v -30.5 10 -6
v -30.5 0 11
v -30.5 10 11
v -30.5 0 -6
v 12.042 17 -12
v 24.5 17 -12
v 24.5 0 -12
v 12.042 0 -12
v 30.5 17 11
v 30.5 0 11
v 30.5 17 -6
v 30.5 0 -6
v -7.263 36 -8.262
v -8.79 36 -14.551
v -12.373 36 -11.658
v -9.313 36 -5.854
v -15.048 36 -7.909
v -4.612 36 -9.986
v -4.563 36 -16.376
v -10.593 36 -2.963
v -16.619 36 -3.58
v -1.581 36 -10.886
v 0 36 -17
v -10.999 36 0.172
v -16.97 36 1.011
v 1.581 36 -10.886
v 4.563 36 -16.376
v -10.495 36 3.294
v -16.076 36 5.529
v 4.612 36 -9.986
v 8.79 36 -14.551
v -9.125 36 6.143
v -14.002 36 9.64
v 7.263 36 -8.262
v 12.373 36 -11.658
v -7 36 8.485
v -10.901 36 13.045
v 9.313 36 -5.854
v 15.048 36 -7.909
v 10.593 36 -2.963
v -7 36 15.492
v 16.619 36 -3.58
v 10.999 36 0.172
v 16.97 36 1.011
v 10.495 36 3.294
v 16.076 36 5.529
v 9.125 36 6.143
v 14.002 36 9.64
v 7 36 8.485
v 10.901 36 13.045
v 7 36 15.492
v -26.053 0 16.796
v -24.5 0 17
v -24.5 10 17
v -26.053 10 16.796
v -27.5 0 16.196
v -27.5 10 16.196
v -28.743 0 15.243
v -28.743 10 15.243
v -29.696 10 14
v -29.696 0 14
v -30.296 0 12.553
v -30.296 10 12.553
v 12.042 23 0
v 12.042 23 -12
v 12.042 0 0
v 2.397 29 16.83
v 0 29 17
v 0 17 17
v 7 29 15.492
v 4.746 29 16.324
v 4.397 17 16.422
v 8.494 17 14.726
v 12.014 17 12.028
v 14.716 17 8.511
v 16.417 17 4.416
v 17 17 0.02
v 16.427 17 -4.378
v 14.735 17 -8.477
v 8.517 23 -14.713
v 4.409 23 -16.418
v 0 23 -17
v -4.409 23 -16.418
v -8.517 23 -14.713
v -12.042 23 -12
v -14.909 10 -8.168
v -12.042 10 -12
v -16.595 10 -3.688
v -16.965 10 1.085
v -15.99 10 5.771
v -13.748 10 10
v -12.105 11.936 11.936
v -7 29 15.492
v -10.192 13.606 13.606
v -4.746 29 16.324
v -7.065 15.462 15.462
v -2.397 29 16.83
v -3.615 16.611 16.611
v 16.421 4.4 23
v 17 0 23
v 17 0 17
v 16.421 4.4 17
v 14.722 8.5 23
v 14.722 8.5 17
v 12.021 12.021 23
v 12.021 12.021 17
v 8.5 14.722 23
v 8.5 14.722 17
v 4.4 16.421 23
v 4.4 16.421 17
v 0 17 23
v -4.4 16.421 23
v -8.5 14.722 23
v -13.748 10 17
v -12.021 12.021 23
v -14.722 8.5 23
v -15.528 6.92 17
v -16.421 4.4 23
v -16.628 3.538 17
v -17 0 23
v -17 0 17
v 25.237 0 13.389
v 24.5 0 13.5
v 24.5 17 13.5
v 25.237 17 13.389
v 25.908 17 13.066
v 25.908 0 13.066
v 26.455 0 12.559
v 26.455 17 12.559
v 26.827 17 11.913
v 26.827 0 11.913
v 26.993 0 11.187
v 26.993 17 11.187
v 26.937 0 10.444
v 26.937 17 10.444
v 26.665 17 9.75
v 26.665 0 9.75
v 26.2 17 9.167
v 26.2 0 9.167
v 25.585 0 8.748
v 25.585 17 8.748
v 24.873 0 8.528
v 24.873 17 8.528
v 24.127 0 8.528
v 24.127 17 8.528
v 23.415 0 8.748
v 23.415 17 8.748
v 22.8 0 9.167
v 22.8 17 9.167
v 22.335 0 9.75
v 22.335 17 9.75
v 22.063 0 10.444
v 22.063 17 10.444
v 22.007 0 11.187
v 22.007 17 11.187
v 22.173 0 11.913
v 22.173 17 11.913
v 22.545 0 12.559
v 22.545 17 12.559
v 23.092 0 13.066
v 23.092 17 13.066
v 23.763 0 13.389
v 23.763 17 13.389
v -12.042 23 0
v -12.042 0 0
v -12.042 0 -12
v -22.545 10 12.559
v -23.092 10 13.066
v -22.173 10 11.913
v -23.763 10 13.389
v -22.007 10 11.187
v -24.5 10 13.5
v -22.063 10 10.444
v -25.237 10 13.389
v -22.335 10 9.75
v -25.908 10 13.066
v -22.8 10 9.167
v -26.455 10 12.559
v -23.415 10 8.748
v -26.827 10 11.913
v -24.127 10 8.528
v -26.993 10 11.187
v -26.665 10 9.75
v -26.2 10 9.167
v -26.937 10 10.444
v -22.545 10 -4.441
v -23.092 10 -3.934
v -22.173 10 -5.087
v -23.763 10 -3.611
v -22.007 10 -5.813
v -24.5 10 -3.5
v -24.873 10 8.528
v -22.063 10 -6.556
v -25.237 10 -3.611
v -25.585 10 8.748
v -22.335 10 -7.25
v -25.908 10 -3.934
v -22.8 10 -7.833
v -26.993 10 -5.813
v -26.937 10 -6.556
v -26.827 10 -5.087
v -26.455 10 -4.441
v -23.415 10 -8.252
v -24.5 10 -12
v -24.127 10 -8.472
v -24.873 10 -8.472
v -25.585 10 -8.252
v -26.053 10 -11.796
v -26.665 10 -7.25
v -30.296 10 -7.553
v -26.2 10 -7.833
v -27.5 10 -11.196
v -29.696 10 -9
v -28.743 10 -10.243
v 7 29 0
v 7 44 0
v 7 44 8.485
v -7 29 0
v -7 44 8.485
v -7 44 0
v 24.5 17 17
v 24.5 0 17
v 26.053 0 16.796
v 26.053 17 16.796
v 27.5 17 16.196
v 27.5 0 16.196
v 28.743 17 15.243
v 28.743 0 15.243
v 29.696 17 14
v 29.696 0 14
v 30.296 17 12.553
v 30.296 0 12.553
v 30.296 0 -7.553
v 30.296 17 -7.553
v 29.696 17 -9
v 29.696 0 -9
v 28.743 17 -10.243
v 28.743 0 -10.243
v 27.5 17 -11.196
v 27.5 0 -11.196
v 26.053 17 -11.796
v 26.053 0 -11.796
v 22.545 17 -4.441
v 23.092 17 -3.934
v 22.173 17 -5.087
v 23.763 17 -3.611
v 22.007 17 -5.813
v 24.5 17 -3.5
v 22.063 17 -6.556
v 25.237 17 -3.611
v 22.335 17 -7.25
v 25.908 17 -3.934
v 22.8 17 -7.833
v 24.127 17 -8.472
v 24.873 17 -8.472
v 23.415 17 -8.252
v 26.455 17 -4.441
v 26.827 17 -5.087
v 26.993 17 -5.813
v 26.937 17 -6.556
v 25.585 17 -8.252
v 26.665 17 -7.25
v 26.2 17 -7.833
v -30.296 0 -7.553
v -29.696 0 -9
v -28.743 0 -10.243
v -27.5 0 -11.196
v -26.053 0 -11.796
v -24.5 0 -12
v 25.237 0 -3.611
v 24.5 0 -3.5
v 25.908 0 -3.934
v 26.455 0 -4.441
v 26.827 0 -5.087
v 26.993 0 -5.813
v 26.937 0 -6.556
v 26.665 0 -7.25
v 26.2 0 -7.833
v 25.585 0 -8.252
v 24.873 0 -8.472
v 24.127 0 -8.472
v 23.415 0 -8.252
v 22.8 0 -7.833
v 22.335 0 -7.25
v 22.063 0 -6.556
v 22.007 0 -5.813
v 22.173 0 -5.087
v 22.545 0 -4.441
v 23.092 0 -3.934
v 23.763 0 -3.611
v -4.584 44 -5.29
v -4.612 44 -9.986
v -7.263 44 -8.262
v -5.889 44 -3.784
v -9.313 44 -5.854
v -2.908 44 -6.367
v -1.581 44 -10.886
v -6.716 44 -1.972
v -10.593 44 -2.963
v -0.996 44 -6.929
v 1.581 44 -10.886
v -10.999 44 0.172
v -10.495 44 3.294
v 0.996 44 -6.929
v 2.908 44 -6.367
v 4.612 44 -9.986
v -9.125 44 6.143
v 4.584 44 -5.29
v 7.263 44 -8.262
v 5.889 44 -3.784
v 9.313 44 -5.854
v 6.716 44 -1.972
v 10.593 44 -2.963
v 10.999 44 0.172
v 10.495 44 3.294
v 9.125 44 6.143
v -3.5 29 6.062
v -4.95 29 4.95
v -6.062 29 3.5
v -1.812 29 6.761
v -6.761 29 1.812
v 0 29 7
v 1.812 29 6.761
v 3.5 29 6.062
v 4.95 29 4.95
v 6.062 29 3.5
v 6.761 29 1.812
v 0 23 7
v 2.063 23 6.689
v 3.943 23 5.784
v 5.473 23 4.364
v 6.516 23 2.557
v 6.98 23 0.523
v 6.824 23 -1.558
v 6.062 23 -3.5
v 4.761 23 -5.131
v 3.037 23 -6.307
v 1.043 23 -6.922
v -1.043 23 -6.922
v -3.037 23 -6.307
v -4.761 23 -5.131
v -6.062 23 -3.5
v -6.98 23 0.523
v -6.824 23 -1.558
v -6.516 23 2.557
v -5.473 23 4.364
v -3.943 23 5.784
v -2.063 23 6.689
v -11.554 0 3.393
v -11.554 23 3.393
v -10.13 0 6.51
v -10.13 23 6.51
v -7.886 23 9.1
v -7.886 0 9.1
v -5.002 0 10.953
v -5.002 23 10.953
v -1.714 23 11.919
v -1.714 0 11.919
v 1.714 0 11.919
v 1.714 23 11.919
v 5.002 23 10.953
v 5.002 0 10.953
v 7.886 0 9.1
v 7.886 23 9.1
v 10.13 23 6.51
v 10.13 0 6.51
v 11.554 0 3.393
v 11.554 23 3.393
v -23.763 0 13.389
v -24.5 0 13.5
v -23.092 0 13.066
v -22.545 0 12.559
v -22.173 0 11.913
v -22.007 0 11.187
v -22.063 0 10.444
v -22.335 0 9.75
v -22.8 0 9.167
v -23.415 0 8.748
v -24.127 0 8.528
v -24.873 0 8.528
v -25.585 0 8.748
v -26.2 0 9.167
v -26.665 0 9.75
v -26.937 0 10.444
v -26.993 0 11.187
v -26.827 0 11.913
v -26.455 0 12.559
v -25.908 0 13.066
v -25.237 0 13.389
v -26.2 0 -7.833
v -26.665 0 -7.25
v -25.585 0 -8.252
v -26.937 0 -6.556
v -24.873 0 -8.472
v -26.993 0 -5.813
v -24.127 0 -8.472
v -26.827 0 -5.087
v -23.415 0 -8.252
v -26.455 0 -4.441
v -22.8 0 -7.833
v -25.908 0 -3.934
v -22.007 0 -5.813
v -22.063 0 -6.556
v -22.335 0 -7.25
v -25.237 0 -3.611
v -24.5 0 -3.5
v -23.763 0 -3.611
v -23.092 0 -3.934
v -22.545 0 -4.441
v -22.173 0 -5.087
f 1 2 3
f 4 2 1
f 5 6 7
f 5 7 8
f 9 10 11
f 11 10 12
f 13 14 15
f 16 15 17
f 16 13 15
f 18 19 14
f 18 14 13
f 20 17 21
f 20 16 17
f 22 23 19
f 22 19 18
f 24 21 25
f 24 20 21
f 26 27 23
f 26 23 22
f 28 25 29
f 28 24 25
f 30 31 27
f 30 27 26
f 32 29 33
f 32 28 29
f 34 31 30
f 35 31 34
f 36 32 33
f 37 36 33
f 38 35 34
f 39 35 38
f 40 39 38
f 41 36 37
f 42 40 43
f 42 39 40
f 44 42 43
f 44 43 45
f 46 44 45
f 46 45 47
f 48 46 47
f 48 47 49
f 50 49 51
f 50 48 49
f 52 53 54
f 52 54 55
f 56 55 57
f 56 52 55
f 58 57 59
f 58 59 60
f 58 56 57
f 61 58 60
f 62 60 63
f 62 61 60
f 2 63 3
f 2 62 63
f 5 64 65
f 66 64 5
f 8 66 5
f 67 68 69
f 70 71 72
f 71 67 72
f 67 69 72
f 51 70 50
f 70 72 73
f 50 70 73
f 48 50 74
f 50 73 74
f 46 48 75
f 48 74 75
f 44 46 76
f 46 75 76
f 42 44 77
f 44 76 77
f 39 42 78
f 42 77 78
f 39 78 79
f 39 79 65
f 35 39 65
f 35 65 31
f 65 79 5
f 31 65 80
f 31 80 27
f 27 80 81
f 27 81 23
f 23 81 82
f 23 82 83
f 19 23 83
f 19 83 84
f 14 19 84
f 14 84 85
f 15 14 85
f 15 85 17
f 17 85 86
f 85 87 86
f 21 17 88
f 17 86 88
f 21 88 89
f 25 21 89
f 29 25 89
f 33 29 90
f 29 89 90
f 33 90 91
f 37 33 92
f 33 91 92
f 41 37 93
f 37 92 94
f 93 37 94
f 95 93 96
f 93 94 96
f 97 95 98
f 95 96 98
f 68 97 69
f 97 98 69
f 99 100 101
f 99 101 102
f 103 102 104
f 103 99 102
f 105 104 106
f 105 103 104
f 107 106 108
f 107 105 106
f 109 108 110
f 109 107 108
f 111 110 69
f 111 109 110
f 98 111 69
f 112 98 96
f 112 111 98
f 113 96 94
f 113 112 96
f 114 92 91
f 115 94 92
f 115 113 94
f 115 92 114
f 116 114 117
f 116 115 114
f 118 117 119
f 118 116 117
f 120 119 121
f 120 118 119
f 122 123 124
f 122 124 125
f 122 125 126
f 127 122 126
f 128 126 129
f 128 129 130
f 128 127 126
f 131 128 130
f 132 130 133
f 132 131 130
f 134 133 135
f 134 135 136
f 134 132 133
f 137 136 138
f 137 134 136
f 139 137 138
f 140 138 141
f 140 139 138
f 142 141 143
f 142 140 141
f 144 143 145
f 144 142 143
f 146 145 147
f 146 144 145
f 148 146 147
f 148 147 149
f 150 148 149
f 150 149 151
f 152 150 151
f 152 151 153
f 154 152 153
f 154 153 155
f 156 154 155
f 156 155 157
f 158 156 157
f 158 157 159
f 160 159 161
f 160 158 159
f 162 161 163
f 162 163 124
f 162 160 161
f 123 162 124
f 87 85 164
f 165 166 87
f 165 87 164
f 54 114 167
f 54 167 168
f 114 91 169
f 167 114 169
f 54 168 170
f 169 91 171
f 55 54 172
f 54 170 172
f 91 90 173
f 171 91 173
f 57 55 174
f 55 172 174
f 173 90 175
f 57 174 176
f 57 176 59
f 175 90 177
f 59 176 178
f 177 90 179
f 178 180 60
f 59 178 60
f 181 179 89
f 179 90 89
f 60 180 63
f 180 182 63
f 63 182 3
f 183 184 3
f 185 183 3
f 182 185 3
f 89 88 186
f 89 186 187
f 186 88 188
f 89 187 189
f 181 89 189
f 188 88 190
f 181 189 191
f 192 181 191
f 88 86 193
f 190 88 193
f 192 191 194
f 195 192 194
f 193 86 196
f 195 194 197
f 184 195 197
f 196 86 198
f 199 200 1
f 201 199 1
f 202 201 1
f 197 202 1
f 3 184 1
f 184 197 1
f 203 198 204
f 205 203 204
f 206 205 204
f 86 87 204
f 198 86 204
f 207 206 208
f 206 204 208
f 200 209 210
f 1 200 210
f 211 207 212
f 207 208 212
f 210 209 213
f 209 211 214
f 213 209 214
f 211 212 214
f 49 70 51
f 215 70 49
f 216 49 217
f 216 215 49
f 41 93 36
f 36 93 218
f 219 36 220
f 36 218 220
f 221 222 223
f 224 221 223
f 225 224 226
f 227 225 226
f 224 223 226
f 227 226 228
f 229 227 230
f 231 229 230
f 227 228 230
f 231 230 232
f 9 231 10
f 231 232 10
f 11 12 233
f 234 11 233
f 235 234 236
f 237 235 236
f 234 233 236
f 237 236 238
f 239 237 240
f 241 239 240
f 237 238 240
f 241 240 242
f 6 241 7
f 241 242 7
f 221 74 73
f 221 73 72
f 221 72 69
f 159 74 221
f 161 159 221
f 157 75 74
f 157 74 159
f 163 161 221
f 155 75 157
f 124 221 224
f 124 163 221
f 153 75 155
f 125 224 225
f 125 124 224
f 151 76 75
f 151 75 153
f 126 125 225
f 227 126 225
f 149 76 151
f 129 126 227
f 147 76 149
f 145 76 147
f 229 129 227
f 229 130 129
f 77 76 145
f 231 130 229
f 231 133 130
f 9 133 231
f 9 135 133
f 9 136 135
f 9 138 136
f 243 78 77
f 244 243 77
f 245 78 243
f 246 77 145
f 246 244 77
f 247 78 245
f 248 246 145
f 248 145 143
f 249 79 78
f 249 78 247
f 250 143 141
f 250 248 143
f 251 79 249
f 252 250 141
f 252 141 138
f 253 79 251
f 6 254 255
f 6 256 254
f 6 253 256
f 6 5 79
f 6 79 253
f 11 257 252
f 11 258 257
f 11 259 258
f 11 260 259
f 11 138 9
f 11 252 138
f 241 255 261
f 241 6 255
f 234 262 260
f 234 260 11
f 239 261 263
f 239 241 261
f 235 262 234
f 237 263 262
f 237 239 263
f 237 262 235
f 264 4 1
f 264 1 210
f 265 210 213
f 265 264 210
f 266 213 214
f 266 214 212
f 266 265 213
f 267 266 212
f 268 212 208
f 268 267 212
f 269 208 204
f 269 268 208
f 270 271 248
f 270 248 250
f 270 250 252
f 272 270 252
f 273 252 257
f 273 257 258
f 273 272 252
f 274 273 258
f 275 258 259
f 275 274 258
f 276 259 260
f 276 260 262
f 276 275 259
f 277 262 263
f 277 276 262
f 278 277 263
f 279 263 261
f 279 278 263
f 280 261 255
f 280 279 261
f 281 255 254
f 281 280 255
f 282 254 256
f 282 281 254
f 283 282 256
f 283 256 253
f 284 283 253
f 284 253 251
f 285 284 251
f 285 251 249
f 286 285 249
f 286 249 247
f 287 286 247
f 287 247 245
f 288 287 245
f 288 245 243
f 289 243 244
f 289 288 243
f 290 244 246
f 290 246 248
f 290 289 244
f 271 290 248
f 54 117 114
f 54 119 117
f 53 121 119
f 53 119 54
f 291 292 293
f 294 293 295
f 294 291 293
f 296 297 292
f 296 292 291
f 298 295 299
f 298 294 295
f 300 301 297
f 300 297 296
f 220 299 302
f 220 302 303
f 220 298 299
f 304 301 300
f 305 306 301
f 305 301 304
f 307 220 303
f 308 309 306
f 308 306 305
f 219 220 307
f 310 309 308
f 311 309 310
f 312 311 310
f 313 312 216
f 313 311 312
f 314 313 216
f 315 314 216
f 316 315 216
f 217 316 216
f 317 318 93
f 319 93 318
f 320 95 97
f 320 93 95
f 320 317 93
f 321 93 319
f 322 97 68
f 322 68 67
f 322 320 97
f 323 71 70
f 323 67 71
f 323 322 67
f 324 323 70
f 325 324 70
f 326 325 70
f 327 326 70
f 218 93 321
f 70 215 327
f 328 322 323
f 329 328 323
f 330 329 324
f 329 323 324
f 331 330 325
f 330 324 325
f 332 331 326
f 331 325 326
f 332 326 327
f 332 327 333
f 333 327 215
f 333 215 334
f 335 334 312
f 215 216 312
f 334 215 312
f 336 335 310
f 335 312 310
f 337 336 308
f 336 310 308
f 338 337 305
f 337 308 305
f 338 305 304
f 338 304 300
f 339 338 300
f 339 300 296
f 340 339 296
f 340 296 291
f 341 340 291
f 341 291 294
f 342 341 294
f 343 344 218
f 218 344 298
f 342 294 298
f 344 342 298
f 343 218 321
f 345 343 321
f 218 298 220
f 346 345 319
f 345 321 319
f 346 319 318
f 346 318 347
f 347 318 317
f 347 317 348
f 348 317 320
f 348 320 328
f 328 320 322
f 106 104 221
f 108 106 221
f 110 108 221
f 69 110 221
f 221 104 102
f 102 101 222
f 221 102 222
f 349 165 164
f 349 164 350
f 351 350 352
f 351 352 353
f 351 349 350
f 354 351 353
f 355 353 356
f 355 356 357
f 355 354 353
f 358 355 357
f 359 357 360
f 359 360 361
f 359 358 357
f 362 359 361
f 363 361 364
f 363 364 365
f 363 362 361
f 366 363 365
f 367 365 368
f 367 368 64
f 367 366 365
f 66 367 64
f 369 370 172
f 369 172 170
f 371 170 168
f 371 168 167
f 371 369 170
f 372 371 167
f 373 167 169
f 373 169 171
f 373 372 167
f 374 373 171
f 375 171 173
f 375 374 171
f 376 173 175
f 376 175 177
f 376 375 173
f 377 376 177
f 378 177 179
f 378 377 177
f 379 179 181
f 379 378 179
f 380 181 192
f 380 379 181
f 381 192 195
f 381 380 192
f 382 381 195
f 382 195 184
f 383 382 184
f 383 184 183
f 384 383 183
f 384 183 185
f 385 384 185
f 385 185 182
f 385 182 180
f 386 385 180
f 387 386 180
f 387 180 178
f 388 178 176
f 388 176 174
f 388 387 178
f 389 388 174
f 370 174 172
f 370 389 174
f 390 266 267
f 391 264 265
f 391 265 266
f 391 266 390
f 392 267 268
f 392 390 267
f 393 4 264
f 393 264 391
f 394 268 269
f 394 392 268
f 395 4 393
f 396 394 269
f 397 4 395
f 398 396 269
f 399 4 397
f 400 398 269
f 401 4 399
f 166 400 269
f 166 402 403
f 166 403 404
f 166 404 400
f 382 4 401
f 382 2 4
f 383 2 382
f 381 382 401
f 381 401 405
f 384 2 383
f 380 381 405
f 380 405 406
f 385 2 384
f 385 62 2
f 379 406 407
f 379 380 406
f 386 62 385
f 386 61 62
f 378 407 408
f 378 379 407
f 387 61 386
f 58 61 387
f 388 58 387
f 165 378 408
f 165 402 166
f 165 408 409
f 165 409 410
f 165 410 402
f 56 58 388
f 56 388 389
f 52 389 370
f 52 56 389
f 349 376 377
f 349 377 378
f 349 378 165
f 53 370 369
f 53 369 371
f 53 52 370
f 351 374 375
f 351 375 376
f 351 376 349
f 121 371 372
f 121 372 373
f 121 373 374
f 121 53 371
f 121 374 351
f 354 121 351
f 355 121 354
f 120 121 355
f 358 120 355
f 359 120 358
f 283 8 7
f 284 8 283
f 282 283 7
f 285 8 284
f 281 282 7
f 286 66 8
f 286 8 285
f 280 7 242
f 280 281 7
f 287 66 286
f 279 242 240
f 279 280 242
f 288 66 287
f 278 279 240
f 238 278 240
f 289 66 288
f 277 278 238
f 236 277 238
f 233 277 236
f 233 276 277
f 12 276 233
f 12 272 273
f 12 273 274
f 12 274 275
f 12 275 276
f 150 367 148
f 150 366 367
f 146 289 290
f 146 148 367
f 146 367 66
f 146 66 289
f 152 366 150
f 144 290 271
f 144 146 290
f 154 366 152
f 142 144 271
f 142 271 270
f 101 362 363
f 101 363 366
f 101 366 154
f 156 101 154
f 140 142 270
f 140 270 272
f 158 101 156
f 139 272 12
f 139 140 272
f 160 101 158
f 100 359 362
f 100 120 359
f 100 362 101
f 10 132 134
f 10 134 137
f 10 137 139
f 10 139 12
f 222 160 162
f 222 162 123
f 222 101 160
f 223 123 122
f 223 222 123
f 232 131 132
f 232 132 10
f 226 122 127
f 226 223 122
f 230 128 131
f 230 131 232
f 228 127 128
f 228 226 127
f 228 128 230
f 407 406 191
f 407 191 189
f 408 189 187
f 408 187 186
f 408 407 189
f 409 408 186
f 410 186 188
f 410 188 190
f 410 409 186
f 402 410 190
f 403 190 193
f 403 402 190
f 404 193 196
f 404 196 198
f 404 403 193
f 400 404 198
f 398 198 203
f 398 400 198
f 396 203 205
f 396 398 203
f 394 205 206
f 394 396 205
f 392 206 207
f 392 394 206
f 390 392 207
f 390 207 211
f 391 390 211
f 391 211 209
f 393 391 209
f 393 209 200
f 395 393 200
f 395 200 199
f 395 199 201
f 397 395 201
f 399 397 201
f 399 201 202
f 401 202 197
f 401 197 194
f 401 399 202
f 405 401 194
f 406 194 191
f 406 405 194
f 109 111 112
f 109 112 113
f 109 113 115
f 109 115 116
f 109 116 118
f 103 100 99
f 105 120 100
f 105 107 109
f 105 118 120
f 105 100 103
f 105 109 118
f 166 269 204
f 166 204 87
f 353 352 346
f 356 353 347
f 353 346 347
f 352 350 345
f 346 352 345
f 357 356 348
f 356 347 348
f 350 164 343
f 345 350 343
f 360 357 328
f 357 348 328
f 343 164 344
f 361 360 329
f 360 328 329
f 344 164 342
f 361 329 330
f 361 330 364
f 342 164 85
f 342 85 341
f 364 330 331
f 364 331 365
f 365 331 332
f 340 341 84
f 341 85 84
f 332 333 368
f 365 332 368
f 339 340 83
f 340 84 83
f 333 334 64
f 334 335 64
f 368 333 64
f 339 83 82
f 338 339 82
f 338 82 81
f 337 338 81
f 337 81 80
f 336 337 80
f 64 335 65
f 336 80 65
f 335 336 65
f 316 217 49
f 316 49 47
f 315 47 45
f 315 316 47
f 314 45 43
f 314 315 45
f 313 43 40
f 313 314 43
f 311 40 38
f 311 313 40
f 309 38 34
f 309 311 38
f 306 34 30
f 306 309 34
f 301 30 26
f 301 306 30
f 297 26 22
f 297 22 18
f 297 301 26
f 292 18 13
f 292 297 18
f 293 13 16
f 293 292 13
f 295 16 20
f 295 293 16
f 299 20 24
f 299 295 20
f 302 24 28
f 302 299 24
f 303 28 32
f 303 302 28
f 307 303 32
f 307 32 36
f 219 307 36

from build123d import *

# Parameters (mm, degrees)
SKETCH_2_R          = 17
EXTRUDE_1_DEPTH     = 36
EXTRUDE_3_REACH     = 52.14
SKETCH_4_R          = 11
SKETCH_5_R          = 7
CUT_EXTRUDE_1_DEPTH = 21
SKETCH_6_W          = 14
SKETCH_6_H          = 15
CUT_EXTRUDE_2_DEPTH = 21
EXTRUDE_5_DEPTH     = 23
SKETCH_8_R          = 2.5
EXTRUDE_6_DEPTH     = 17
SKETCH_9_R          = 2.5
EXTRUDE_7_DEPTH     = 10
CUT_EXTRUDE_3_DEPTH = 23


with BuildPart() as part:
    # 草图2 → 凸台-拉伸1 (new body)
    with BuildSketch(Plane(origin=(0, 0, 0), x_dir=(1, 0, 0), z_dir=(0, 1, 0))):
        with Locations(Location((0, 0, 0), (0, 0, 270))):
            Circle(SKETCH_2_R)
    extrude(amount=EXTRUDE_1_DEPTH)

    # 草图4 → 凸台-拉伸3 (add, up to next)
    with BuildSketch(Plane(origin=(0, 44, 0), x_dir=(1, 0, 0), z_dir=(0, 1, 0)), mode=Mode.PRIVATE) as extrude_3_sk1:
        with Locations(Location((0, 0, 0), (0, 0, 270))):
            Circle(SKETCH_4_R)
    extrude_3_tool1 = extrude(extrude_3_sk1.sketch, amount=-EXTRUDE_3_REACH, mode=Mode.PRIVATE) - part.part
    add(extrude_3_tool1.solids().sort_by_distance((0, 44, 0))[0])

    # 草图5 → 切除-拉伸1 (cut)
    with BuildSketch(Plane(origin=(0, 44, 0), x_dir=(1, 0, 0), z_dir=(0, 1, 0))):
        with Locations(Location((0, 0, 0), (0, 0, 270))):
            Circle(SKETCH_5_R)
    extrude(amount=-CUT_EXTRUDE_1_DEPTH, mode=Mode.SUBTRACT)

    # 草图6 → 切除-拉伸2 (cut)
    with BuildSketch(Plane.XY):
        with Locations((0, 36.5)):
            Rectangle(SKETCH_6_W, SKETCH_6_H)
    extrude(amount=CUT_EXTRUDE_2_DEPTH, mode=Mode.SUBTRACT)

    # 草图7 → 凸台-拉伸5 (add)
    with BuildSketch(Plane.XY.offset(23)):
        with BuildLine():
            Line((-17, 0), (17, 0))
            ThreePointArc((17, 0), (0, 17), (-17, 0))
        make_face()
    extrude(amount=-EXTRUDE_5_DEPTH)

    # 草图8 → 凸台-拉伸6 (add)
    with BuildSketch(Plane(origin=(0, 0, 0), x_dir=(1, 0, 0), z_dir=(0, 1, 0))):
        with BuildLine():
            Line((0, 12), (0, -17))
            Line((0, -17), (24.5, -17))
            ThreePointArc((24.5, -17), (28.742640687, -15.242640687), (30.5, -11))
            Line((30.5, -11), (30.5, 6))
            ThreePointArc((30.5, 6), (28.742640687, 10.242640687), (24.5, 12))
            Line((24.5, 12), (0, 12))
        make_face()
        with Locations(Location((24.5, 6, 0), (0, 0, 270))):
            Circle(SKETCH_8_R, mode=Mode.SUBTRACT)
        with Locations(Location((24.5, -11, 0), (0, 0, 270))):
            Circle(SKETCH_8_R, mode=Mode.SUBTRACT)
    extrude(amount=EXTRUDE_6_DEPTH)

    # 草图9 → 凸台-拉伸7 (add)
    with BuildSketch(Plane(origin=(0, 0, 0), x_dir=(1, 0, 0), z_dir=(0, 1, 0))):
        with BuildLine():
            Line((0, 12), (0, -17))
            Line((0, -17), (-24.5, -17))
            ThreePointArc((-24.5, -17), (-28.742640687, -15.242640687), (-30.5, -11))
            Line((-30.5, -11), (-30.5, 6))
            ThreePointArc((-30.5, 6), (-28.742640687, 10.242640687), (-24.5, 12))
            Line((-24.5, 12), (0, 12))
        make_face()
        with Locations(Location((-24.5, 6, 0), (0, 0, 270))):
            Circle(SKETCH_9_R, mode=Mode.SUBTRACT)
        with Locations(Location((-24.5, -11, 0), (0, 0, 270))):
            Circle(SKETCH_9_R, mode=Mode.SUBTRACT)
    extrude(amount=EXTRUDE_7_DEPTH)

    # 草图10 → 切除-拉伸3 (cut)
    with BuildSketch(Plane(origin=(0, 0, 0), x_dir=(1, 0, 0), z_dir=(0, 1, 0))):
        with BuildLine():
            Line((-12.041594579, 12), (-12.041594579, 0))
            ThreePointArc((-12.041594579, 0), (0, -12.041594579), (12.041594579, 0))
            Line((12.041594579, 0), (12.041594579, 12))
            ThreePointArc((12.041594579, 12), (0, 17), (-12.041594579, 12))
        make_face()
    extrude(amount=CUT_EXTRUDE_3_DEPTH, mode=Mode.SUBTRACT)


solid = part.part
